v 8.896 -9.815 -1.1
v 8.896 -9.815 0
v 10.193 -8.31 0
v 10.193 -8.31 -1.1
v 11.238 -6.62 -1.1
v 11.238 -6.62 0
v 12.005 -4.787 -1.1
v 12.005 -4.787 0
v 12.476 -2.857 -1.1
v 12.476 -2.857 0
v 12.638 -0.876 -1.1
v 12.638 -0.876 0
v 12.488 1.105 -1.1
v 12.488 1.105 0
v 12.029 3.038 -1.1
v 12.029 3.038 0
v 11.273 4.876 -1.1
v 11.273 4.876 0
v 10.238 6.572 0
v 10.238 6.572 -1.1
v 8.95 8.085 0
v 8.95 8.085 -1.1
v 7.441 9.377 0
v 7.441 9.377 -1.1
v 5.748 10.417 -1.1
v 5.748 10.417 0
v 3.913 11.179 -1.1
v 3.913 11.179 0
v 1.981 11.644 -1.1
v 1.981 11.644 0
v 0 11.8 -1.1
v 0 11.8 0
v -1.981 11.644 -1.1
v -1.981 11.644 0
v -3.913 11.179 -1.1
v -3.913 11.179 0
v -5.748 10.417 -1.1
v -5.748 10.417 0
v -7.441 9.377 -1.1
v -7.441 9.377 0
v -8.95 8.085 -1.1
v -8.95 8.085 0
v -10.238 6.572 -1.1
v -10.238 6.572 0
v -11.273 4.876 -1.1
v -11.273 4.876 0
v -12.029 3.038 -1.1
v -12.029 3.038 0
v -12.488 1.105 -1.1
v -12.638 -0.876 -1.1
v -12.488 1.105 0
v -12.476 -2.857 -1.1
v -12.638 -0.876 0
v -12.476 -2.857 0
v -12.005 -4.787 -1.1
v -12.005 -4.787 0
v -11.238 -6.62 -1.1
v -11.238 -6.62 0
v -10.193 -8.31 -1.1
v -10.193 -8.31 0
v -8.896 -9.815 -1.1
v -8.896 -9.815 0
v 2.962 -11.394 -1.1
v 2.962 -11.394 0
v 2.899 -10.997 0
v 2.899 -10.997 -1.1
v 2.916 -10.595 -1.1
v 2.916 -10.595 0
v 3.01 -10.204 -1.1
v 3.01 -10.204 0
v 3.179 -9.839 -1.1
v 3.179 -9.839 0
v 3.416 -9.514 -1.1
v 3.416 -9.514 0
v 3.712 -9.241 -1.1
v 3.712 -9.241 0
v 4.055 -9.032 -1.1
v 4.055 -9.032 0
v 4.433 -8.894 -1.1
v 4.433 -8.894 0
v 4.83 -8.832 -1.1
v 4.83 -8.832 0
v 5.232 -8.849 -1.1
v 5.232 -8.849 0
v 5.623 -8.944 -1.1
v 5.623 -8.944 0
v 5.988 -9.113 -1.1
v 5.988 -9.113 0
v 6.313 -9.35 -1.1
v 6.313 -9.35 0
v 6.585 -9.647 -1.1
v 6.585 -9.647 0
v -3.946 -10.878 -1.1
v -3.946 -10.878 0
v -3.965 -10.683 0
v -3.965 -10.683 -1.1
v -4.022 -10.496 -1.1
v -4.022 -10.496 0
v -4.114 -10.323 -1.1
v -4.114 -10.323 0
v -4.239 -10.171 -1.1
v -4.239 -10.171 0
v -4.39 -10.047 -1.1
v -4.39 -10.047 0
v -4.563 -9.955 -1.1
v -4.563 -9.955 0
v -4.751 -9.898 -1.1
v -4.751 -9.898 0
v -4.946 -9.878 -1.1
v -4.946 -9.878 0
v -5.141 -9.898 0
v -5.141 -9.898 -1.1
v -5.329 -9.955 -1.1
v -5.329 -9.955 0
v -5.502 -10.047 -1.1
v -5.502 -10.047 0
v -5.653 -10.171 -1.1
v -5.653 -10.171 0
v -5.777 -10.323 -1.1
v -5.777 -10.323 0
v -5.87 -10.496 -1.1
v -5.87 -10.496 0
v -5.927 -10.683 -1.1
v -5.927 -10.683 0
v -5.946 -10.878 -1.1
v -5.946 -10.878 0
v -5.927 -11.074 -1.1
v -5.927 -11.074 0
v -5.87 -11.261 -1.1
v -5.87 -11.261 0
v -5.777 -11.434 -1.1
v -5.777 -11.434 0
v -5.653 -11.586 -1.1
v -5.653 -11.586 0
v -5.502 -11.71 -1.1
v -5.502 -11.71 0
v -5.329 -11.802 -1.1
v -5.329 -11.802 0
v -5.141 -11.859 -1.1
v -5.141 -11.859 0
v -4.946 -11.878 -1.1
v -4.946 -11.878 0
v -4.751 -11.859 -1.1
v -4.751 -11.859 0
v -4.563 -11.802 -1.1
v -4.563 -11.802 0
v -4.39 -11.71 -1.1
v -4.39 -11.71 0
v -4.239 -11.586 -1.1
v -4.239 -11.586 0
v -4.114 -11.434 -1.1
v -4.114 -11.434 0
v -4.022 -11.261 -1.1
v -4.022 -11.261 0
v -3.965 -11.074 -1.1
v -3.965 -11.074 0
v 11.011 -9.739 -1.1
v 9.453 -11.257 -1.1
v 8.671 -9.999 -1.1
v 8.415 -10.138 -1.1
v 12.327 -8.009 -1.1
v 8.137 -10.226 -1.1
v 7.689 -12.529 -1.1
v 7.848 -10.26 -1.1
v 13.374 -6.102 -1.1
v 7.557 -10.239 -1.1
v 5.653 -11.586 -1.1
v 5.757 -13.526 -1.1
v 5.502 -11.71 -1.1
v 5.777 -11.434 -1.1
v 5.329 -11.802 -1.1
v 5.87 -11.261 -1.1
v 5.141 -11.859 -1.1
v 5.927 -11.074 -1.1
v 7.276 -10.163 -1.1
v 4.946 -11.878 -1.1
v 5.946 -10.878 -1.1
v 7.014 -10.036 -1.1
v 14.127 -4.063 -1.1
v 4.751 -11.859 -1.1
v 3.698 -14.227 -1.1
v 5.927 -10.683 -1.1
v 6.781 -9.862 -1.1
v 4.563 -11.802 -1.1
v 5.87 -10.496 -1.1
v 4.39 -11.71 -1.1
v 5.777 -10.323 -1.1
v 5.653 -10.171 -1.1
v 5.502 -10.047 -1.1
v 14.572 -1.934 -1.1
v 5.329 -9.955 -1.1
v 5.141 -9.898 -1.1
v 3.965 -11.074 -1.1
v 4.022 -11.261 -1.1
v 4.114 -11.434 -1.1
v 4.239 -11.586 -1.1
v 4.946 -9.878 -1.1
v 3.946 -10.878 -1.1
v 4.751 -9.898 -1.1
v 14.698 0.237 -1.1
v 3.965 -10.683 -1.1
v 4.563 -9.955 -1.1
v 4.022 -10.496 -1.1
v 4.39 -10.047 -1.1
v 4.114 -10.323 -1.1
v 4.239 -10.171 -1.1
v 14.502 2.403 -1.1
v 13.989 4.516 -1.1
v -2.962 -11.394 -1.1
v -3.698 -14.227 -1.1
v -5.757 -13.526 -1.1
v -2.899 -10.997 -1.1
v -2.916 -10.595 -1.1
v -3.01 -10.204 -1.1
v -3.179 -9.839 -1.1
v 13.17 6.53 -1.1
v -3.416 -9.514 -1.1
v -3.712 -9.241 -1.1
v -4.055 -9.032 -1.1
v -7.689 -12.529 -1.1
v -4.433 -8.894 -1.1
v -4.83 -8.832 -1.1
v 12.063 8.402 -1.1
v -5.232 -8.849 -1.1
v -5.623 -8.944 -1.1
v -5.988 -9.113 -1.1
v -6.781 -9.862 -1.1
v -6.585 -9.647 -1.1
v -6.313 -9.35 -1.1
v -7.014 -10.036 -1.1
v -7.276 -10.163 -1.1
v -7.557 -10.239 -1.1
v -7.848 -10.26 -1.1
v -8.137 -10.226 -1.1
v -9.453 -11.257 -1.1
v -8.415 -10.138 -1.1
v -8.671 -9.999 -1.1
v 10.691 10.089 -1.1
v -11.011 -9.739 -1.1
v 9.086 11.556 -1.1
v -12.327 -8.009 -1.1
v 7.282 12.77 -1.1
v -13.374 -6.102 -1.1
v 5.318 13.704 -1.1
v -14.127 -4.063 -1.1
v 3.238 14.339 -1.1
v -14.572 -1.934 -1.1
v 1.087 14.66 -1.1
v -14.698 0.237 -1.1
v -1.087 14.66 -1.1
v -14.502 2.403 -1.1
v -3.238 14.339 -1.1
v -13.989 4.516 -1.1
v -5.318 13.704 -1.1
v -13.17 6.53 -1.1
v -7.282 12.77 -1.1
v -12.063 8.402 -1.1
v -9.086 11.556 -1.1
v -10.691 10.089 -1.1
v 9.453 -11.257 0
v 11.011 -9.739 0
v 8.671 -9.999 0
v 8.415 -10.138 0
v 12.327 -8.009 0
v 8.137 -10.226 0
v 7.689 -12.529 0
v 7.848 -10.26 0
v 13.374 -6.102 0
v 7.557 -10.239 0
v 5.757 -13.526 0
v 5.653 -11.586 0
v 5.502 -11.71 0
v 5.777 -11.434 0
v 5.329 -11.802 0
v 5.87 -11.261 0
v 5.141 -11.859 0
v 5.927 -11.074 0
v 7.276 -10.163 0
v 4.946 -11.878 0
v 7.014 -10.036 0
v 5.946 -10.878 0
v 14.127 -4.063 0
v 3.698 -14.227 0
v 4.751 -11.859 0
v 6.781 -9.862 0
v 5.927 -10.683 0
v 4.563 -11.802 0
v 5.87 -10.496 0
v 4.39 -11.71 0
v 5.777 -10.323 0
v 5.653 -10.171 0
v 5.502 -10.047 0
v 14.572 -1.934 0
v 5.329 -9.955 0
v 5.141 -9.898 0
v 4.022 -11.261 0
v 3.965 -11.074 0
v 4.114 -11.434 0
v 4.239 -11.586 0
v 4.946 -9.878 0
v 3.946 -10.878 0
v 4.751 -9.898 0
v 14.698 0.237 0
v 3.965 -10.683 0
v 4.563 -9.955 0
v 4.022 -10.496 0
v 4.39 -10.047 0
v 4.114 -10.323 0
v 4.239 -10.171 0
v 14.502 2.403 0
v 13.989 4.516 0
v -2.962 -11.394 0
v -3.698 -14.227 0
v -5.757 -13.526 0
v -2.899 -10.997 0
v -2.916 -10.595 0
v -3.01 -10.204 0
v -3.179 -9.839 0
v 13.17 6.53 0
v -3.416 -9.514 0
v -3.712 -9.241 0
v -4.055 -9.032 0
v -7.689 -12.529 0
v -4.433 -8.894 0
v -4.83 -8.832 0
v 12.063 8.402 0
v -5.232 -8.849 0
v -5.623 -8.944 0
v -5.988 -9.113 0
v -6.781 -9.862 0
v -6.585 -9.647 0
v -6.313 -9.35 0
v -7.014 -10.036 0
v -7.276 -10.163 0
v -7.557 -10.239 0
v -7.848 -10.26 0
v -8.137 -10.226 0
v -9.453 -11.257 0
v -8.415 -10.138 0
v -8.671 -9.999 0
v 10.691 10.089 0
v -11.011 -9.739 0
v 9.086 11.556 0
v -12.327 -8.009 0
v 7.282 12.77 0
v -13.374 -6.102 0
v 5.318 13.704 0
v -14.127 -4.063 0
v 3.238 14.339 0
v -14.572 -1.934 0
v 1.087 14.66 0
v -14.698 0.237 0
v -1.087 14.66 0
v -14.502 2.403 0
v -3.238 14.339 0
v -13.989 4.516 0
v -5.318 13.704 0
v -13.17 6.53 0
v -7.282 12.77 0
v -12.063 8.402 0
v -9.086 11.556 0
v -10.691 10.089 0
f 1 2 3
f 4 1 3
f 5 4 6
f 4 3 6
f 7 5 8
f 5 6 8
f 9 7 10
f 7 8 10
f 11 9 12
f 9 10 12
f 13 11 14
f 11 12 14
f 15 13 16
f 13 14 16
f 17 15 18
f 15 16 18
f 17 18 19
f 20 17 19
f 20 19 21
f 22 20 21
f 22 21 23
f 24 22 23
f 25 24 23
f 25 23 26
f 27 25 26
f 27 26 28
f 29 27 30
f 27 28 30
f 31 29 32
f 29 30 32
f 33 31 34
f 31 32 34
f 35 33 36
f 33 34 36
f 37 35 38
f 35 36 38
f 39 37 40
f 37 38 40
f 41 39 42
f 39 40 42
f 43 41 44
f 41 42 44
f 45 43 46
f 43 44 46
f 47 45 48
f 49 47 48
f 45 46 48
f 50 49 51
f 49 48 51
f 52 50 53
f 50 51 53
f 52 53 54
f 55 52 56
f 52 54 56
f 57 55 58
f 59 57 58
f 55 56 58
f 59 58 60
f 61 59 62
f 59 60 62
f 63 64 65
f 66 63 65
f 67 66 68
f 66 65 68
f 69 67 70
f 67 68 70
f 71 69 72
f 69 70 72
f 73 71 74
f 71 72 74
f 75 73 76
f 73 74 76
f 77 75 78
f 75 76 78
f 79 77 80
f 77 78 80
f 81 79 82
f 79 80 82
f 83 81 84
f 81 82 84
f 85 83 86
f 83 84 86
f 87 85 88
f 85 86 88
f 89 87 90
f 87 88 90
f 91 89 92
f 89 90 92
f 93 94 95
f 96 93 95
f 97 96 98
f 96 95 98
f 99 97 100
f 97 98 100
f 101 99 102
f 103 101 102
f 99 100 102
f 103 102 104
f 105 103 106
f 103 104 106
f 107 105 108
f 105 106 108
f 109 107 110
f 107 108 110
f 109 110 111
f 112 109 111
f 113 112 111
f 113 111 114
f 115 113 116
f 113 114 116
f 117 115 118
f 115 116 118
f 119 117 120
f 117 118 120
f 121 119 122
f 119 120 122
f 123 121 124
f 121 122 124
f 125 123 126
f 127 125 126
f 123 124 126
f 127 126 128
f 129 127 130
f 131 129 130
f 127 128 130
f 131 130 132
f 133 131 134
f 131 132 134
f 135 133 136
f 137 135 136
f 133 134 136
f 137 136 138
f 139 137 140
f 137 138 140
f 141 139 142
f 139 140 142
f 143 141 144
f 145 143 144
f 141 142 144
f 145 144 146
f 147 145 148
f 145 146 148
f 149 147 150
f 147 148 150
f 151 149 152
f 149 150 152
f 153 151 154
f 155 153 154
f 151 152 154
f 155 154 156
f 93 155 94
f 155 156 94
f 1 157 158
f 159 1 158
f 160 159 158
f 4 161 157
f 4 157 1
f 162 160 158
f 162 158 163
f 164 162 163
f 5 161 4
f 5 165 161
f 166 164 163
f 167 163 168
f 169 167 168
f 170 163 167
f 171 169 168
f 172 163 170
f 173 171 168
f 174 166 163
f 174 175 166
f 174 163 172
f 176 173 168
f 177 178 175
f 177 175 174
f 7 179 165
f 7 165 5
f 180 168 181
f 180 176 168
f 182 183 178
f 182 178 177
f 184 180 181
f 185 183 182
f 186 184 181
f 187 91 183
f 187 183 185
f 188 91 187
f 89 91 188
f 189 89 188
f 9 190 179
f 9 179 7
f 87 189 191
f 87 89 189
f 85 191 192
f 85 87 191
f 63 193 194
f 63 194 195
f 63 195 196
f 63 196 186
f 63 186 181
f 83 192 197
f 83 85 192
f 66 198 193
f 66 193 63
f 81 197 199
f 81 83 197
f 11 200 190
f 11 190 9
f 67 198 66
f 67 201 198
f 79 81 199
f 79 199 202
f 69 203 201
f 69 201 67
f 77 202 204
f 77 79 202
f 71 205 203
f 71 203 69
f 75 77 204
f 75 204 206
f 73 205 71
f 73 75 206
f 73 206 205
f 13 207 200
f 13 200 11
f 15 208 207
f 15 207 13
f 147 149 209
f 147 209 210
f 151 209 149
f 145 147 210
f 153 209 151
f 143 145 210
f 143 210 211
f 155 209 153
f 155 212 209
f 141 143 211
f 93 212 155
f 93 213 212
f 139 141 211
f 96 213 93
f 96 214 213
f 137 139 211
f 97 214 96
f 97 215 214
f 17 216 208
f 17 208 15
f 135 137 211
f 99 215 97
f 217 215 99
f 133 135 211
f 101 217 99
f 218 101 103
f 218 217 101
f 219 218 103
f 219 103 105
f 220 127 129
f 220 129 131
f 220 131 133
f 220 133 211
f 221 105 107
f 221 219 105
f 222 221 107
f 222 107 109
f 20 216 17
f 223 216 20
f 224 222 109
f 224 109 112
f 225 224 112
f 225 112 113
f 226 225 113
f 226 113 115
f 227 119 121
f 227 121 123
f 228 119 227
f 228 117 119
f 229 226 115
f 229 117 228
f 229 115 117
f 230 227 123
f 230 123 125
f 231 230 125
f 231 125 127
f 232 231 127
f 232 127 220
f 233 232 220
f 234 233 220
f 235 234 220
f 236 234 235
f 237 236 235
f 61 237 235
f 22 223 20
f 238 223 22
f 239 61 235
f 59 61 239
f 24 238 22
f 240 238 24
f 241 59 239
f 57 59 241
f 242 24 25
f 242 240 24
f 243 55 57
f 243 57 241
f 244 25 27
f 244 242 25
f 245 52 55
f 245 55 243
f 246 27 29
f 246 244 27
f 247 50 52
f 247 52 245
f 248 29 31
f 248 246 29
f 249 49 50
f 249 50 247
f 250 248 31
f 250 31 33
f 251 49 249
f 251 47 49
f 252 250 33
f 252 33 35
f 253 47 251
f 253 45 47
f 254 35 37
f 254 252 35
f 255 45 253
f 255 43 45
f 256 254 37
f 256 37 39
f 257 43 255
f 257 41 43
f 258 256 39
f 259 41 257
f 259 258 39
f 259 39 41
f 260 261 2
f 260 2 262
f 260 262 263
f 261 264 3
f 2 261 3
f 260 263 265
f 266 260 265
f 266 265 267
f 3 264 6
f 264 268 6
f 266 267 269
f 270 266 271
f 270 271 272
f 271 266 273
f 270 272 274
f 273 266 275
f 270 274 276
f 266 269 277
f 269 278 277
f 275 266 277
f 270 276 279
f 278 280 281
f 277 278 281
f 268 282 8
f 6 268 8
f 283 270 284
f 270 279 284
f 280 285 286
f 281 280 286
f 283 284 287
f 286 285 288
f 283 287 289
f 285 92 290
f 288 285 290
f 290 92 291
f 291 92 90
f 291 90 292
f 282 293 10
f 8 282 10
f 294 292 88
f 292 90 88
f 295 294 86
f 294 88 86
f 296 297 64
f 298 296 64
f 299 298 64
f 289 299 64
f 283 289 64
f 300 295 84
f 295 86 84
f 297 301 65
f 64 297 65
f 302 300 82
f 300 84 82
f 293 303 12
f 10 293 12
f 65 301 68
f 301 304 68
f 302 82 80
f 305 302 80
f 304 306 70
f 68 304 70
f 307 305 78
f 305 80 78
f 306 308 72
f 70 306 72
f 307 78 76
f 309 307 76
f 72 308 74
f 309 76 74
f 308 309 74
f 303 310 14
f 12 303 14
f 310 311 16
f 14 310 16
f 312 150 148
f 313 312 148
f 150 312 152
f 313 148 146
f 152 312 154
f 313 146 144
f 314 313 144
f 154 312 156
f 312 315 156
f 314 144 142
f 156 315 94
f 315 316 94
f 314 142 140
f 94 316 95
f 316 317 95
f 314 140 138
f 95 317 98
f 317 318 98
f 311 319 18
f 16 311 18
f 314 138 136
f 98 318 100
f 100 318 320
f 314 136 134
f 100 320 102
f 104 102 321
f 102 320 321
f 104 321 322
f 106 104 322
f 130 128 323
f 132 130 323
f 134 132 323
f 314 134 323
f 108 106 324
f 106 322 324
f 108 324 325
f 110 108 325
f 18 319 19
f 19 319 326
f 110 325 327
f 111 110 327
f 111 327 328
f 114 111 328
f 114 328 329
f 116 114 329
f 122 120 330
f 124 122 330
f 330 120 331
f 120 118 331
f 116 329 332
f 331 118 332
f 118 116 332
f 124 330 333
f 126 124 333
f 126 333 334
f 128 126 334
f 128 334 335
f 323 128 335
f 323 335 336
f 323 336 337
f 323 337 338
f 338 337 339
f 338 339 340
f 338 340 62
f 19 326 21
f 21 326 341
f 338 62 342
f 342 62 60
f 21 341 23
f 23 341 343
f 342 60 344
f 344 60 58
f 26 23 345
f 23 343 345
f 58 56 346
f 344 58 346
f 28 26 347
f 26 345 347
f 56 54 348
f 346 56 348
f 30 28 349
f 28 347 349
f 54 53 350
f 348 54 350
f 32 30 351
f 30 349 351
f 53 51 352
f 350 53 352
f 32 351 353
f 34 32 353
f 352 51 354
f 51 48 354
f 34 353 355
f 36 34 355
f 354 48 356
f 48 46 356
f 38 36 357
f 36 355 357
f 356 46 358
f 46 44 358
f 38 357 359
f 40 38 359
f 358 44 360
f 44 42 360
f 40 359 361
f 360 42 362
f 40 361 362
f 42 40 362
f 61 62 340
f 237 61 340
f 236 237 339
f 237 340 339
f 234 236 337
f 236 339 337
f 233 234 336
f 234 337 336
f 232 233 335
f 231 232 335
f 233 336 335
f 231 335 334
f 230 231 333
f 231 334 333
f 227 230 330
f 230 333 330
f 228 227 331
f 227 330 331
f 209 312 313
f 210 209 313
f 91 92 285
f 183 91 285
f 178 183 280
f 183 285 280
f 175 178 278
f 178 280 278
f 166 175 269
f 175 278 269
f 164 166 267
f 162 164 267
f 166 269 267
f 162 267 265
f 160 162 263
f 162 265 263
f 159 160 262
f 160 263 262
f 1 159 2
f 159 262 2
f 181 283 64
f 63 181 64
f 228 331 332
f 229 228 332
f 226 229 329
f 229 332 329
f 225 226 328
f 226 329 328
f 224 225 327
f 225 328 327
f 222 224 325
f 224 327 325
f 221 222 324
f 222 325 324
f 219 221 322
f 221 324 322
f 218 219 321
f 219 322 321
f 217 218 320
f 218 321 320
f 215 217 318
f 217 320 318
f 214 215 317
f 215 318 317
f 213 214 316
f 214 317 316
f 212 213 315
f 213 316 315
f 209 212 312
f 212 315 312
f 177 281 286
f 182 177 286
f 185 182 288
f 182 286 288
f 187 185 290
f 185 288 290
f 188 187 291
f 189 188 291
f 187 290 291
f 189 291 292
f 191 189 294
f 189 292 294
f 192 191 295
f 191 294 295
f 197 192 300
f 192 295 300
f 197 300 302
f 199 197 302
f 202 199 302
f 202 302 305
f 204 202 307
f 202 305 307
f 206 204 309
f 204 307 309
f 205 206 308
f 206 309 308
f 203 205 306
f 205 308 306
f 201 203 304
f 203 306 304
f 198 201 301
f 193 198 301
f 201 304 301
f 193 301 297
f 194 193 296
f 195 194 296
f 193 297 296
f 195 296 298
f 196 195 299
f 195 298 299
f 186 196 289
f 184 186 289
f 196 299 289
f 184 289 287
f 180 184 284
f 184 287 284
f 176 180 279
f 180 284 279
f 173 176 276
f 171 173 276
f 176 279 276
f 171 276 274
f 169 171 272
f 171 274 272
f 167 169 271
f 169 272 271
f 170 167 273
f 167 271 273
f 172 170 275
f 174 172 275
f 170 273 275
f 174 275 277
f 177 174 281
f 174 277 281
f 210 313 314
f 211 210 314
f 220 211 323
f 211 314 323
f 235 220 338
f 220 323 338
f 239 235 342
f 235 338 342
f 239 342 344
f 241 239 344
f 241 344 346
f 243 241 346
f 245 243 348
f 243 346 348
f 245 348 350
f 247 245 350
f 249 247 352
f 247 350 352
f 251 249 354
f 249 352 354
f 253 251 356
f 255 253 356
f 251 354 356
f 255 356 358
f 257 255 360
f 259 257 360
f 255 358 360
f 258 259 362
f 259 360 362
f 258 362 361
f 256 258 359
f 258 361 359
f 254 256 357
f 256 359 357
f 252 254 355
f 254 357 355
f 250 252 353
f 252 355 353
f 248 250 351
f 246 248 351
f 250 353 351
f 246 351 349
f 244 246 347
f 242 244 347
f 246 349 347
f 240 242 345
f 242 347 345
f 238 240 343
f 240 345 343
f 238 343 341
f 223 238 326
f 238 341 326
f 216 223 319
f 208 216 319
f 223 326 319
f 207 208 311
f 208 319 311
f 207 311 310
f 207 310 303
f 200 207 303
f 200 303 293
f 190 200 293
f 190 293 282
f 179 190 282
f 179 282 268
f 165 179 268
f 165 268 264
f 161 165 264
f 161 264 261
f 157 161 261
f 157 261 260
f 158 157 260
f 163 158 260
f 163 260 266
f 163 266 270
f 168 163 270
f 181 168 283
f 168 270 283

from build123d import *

# Parameters (mm, degrees)
BODYSKE_R  = 1
BODY_DEPTH = 1.1


with BuildPart() as part:
    # BodySke → Body (new body)
    with BuildSketch(Plane.XY):
        with BuildLine():
            Line((3.698325427, -14.227170802), (2.961893262, -11.394173437))
            ThreePointArc((2.961893262, -11.394173437), (4.055312562, -9.032003244), (6.584655155, -9.646690019))
            ThreePointArc((6.584655155, -9.646690019), (7.702025194, -10.256332456), (8.895921915, -9.814981887))
            ThreePointArc((8.895921915, -9.814981887), (0, 11.8), (-8.895921915, -9.814981887))
            ThreePointArc((-8.895921915, -9.814981887), (-7.702025194, -10.256332456), (-6.584655155, -9.646690019))
            ThreePointArc((-6.584655155, -9.646690019), (-4.055312562, -9.032003244), (-2.961893262, -11.394173437))
            Line((-2.961893262, -11.394173437), (-3.698325427, -14.227170802))
            ThreePointArc((-3.698325427, -14.227170802), (0, 14.7), (3.698325427, -14.227170802))
        make_face()
        with Locations((4.945954497, -10.878420571)):
            Circle(BODYSKE_R, mode=Mode.SUBTRACT)
        with Locations((-4.945954497, -10.878420571)):
            Circle(BODYSKE_R, mode=Mode.SUBTRACT)
    extrude(amount=-BODY_DEPTH)


solid = part.part
